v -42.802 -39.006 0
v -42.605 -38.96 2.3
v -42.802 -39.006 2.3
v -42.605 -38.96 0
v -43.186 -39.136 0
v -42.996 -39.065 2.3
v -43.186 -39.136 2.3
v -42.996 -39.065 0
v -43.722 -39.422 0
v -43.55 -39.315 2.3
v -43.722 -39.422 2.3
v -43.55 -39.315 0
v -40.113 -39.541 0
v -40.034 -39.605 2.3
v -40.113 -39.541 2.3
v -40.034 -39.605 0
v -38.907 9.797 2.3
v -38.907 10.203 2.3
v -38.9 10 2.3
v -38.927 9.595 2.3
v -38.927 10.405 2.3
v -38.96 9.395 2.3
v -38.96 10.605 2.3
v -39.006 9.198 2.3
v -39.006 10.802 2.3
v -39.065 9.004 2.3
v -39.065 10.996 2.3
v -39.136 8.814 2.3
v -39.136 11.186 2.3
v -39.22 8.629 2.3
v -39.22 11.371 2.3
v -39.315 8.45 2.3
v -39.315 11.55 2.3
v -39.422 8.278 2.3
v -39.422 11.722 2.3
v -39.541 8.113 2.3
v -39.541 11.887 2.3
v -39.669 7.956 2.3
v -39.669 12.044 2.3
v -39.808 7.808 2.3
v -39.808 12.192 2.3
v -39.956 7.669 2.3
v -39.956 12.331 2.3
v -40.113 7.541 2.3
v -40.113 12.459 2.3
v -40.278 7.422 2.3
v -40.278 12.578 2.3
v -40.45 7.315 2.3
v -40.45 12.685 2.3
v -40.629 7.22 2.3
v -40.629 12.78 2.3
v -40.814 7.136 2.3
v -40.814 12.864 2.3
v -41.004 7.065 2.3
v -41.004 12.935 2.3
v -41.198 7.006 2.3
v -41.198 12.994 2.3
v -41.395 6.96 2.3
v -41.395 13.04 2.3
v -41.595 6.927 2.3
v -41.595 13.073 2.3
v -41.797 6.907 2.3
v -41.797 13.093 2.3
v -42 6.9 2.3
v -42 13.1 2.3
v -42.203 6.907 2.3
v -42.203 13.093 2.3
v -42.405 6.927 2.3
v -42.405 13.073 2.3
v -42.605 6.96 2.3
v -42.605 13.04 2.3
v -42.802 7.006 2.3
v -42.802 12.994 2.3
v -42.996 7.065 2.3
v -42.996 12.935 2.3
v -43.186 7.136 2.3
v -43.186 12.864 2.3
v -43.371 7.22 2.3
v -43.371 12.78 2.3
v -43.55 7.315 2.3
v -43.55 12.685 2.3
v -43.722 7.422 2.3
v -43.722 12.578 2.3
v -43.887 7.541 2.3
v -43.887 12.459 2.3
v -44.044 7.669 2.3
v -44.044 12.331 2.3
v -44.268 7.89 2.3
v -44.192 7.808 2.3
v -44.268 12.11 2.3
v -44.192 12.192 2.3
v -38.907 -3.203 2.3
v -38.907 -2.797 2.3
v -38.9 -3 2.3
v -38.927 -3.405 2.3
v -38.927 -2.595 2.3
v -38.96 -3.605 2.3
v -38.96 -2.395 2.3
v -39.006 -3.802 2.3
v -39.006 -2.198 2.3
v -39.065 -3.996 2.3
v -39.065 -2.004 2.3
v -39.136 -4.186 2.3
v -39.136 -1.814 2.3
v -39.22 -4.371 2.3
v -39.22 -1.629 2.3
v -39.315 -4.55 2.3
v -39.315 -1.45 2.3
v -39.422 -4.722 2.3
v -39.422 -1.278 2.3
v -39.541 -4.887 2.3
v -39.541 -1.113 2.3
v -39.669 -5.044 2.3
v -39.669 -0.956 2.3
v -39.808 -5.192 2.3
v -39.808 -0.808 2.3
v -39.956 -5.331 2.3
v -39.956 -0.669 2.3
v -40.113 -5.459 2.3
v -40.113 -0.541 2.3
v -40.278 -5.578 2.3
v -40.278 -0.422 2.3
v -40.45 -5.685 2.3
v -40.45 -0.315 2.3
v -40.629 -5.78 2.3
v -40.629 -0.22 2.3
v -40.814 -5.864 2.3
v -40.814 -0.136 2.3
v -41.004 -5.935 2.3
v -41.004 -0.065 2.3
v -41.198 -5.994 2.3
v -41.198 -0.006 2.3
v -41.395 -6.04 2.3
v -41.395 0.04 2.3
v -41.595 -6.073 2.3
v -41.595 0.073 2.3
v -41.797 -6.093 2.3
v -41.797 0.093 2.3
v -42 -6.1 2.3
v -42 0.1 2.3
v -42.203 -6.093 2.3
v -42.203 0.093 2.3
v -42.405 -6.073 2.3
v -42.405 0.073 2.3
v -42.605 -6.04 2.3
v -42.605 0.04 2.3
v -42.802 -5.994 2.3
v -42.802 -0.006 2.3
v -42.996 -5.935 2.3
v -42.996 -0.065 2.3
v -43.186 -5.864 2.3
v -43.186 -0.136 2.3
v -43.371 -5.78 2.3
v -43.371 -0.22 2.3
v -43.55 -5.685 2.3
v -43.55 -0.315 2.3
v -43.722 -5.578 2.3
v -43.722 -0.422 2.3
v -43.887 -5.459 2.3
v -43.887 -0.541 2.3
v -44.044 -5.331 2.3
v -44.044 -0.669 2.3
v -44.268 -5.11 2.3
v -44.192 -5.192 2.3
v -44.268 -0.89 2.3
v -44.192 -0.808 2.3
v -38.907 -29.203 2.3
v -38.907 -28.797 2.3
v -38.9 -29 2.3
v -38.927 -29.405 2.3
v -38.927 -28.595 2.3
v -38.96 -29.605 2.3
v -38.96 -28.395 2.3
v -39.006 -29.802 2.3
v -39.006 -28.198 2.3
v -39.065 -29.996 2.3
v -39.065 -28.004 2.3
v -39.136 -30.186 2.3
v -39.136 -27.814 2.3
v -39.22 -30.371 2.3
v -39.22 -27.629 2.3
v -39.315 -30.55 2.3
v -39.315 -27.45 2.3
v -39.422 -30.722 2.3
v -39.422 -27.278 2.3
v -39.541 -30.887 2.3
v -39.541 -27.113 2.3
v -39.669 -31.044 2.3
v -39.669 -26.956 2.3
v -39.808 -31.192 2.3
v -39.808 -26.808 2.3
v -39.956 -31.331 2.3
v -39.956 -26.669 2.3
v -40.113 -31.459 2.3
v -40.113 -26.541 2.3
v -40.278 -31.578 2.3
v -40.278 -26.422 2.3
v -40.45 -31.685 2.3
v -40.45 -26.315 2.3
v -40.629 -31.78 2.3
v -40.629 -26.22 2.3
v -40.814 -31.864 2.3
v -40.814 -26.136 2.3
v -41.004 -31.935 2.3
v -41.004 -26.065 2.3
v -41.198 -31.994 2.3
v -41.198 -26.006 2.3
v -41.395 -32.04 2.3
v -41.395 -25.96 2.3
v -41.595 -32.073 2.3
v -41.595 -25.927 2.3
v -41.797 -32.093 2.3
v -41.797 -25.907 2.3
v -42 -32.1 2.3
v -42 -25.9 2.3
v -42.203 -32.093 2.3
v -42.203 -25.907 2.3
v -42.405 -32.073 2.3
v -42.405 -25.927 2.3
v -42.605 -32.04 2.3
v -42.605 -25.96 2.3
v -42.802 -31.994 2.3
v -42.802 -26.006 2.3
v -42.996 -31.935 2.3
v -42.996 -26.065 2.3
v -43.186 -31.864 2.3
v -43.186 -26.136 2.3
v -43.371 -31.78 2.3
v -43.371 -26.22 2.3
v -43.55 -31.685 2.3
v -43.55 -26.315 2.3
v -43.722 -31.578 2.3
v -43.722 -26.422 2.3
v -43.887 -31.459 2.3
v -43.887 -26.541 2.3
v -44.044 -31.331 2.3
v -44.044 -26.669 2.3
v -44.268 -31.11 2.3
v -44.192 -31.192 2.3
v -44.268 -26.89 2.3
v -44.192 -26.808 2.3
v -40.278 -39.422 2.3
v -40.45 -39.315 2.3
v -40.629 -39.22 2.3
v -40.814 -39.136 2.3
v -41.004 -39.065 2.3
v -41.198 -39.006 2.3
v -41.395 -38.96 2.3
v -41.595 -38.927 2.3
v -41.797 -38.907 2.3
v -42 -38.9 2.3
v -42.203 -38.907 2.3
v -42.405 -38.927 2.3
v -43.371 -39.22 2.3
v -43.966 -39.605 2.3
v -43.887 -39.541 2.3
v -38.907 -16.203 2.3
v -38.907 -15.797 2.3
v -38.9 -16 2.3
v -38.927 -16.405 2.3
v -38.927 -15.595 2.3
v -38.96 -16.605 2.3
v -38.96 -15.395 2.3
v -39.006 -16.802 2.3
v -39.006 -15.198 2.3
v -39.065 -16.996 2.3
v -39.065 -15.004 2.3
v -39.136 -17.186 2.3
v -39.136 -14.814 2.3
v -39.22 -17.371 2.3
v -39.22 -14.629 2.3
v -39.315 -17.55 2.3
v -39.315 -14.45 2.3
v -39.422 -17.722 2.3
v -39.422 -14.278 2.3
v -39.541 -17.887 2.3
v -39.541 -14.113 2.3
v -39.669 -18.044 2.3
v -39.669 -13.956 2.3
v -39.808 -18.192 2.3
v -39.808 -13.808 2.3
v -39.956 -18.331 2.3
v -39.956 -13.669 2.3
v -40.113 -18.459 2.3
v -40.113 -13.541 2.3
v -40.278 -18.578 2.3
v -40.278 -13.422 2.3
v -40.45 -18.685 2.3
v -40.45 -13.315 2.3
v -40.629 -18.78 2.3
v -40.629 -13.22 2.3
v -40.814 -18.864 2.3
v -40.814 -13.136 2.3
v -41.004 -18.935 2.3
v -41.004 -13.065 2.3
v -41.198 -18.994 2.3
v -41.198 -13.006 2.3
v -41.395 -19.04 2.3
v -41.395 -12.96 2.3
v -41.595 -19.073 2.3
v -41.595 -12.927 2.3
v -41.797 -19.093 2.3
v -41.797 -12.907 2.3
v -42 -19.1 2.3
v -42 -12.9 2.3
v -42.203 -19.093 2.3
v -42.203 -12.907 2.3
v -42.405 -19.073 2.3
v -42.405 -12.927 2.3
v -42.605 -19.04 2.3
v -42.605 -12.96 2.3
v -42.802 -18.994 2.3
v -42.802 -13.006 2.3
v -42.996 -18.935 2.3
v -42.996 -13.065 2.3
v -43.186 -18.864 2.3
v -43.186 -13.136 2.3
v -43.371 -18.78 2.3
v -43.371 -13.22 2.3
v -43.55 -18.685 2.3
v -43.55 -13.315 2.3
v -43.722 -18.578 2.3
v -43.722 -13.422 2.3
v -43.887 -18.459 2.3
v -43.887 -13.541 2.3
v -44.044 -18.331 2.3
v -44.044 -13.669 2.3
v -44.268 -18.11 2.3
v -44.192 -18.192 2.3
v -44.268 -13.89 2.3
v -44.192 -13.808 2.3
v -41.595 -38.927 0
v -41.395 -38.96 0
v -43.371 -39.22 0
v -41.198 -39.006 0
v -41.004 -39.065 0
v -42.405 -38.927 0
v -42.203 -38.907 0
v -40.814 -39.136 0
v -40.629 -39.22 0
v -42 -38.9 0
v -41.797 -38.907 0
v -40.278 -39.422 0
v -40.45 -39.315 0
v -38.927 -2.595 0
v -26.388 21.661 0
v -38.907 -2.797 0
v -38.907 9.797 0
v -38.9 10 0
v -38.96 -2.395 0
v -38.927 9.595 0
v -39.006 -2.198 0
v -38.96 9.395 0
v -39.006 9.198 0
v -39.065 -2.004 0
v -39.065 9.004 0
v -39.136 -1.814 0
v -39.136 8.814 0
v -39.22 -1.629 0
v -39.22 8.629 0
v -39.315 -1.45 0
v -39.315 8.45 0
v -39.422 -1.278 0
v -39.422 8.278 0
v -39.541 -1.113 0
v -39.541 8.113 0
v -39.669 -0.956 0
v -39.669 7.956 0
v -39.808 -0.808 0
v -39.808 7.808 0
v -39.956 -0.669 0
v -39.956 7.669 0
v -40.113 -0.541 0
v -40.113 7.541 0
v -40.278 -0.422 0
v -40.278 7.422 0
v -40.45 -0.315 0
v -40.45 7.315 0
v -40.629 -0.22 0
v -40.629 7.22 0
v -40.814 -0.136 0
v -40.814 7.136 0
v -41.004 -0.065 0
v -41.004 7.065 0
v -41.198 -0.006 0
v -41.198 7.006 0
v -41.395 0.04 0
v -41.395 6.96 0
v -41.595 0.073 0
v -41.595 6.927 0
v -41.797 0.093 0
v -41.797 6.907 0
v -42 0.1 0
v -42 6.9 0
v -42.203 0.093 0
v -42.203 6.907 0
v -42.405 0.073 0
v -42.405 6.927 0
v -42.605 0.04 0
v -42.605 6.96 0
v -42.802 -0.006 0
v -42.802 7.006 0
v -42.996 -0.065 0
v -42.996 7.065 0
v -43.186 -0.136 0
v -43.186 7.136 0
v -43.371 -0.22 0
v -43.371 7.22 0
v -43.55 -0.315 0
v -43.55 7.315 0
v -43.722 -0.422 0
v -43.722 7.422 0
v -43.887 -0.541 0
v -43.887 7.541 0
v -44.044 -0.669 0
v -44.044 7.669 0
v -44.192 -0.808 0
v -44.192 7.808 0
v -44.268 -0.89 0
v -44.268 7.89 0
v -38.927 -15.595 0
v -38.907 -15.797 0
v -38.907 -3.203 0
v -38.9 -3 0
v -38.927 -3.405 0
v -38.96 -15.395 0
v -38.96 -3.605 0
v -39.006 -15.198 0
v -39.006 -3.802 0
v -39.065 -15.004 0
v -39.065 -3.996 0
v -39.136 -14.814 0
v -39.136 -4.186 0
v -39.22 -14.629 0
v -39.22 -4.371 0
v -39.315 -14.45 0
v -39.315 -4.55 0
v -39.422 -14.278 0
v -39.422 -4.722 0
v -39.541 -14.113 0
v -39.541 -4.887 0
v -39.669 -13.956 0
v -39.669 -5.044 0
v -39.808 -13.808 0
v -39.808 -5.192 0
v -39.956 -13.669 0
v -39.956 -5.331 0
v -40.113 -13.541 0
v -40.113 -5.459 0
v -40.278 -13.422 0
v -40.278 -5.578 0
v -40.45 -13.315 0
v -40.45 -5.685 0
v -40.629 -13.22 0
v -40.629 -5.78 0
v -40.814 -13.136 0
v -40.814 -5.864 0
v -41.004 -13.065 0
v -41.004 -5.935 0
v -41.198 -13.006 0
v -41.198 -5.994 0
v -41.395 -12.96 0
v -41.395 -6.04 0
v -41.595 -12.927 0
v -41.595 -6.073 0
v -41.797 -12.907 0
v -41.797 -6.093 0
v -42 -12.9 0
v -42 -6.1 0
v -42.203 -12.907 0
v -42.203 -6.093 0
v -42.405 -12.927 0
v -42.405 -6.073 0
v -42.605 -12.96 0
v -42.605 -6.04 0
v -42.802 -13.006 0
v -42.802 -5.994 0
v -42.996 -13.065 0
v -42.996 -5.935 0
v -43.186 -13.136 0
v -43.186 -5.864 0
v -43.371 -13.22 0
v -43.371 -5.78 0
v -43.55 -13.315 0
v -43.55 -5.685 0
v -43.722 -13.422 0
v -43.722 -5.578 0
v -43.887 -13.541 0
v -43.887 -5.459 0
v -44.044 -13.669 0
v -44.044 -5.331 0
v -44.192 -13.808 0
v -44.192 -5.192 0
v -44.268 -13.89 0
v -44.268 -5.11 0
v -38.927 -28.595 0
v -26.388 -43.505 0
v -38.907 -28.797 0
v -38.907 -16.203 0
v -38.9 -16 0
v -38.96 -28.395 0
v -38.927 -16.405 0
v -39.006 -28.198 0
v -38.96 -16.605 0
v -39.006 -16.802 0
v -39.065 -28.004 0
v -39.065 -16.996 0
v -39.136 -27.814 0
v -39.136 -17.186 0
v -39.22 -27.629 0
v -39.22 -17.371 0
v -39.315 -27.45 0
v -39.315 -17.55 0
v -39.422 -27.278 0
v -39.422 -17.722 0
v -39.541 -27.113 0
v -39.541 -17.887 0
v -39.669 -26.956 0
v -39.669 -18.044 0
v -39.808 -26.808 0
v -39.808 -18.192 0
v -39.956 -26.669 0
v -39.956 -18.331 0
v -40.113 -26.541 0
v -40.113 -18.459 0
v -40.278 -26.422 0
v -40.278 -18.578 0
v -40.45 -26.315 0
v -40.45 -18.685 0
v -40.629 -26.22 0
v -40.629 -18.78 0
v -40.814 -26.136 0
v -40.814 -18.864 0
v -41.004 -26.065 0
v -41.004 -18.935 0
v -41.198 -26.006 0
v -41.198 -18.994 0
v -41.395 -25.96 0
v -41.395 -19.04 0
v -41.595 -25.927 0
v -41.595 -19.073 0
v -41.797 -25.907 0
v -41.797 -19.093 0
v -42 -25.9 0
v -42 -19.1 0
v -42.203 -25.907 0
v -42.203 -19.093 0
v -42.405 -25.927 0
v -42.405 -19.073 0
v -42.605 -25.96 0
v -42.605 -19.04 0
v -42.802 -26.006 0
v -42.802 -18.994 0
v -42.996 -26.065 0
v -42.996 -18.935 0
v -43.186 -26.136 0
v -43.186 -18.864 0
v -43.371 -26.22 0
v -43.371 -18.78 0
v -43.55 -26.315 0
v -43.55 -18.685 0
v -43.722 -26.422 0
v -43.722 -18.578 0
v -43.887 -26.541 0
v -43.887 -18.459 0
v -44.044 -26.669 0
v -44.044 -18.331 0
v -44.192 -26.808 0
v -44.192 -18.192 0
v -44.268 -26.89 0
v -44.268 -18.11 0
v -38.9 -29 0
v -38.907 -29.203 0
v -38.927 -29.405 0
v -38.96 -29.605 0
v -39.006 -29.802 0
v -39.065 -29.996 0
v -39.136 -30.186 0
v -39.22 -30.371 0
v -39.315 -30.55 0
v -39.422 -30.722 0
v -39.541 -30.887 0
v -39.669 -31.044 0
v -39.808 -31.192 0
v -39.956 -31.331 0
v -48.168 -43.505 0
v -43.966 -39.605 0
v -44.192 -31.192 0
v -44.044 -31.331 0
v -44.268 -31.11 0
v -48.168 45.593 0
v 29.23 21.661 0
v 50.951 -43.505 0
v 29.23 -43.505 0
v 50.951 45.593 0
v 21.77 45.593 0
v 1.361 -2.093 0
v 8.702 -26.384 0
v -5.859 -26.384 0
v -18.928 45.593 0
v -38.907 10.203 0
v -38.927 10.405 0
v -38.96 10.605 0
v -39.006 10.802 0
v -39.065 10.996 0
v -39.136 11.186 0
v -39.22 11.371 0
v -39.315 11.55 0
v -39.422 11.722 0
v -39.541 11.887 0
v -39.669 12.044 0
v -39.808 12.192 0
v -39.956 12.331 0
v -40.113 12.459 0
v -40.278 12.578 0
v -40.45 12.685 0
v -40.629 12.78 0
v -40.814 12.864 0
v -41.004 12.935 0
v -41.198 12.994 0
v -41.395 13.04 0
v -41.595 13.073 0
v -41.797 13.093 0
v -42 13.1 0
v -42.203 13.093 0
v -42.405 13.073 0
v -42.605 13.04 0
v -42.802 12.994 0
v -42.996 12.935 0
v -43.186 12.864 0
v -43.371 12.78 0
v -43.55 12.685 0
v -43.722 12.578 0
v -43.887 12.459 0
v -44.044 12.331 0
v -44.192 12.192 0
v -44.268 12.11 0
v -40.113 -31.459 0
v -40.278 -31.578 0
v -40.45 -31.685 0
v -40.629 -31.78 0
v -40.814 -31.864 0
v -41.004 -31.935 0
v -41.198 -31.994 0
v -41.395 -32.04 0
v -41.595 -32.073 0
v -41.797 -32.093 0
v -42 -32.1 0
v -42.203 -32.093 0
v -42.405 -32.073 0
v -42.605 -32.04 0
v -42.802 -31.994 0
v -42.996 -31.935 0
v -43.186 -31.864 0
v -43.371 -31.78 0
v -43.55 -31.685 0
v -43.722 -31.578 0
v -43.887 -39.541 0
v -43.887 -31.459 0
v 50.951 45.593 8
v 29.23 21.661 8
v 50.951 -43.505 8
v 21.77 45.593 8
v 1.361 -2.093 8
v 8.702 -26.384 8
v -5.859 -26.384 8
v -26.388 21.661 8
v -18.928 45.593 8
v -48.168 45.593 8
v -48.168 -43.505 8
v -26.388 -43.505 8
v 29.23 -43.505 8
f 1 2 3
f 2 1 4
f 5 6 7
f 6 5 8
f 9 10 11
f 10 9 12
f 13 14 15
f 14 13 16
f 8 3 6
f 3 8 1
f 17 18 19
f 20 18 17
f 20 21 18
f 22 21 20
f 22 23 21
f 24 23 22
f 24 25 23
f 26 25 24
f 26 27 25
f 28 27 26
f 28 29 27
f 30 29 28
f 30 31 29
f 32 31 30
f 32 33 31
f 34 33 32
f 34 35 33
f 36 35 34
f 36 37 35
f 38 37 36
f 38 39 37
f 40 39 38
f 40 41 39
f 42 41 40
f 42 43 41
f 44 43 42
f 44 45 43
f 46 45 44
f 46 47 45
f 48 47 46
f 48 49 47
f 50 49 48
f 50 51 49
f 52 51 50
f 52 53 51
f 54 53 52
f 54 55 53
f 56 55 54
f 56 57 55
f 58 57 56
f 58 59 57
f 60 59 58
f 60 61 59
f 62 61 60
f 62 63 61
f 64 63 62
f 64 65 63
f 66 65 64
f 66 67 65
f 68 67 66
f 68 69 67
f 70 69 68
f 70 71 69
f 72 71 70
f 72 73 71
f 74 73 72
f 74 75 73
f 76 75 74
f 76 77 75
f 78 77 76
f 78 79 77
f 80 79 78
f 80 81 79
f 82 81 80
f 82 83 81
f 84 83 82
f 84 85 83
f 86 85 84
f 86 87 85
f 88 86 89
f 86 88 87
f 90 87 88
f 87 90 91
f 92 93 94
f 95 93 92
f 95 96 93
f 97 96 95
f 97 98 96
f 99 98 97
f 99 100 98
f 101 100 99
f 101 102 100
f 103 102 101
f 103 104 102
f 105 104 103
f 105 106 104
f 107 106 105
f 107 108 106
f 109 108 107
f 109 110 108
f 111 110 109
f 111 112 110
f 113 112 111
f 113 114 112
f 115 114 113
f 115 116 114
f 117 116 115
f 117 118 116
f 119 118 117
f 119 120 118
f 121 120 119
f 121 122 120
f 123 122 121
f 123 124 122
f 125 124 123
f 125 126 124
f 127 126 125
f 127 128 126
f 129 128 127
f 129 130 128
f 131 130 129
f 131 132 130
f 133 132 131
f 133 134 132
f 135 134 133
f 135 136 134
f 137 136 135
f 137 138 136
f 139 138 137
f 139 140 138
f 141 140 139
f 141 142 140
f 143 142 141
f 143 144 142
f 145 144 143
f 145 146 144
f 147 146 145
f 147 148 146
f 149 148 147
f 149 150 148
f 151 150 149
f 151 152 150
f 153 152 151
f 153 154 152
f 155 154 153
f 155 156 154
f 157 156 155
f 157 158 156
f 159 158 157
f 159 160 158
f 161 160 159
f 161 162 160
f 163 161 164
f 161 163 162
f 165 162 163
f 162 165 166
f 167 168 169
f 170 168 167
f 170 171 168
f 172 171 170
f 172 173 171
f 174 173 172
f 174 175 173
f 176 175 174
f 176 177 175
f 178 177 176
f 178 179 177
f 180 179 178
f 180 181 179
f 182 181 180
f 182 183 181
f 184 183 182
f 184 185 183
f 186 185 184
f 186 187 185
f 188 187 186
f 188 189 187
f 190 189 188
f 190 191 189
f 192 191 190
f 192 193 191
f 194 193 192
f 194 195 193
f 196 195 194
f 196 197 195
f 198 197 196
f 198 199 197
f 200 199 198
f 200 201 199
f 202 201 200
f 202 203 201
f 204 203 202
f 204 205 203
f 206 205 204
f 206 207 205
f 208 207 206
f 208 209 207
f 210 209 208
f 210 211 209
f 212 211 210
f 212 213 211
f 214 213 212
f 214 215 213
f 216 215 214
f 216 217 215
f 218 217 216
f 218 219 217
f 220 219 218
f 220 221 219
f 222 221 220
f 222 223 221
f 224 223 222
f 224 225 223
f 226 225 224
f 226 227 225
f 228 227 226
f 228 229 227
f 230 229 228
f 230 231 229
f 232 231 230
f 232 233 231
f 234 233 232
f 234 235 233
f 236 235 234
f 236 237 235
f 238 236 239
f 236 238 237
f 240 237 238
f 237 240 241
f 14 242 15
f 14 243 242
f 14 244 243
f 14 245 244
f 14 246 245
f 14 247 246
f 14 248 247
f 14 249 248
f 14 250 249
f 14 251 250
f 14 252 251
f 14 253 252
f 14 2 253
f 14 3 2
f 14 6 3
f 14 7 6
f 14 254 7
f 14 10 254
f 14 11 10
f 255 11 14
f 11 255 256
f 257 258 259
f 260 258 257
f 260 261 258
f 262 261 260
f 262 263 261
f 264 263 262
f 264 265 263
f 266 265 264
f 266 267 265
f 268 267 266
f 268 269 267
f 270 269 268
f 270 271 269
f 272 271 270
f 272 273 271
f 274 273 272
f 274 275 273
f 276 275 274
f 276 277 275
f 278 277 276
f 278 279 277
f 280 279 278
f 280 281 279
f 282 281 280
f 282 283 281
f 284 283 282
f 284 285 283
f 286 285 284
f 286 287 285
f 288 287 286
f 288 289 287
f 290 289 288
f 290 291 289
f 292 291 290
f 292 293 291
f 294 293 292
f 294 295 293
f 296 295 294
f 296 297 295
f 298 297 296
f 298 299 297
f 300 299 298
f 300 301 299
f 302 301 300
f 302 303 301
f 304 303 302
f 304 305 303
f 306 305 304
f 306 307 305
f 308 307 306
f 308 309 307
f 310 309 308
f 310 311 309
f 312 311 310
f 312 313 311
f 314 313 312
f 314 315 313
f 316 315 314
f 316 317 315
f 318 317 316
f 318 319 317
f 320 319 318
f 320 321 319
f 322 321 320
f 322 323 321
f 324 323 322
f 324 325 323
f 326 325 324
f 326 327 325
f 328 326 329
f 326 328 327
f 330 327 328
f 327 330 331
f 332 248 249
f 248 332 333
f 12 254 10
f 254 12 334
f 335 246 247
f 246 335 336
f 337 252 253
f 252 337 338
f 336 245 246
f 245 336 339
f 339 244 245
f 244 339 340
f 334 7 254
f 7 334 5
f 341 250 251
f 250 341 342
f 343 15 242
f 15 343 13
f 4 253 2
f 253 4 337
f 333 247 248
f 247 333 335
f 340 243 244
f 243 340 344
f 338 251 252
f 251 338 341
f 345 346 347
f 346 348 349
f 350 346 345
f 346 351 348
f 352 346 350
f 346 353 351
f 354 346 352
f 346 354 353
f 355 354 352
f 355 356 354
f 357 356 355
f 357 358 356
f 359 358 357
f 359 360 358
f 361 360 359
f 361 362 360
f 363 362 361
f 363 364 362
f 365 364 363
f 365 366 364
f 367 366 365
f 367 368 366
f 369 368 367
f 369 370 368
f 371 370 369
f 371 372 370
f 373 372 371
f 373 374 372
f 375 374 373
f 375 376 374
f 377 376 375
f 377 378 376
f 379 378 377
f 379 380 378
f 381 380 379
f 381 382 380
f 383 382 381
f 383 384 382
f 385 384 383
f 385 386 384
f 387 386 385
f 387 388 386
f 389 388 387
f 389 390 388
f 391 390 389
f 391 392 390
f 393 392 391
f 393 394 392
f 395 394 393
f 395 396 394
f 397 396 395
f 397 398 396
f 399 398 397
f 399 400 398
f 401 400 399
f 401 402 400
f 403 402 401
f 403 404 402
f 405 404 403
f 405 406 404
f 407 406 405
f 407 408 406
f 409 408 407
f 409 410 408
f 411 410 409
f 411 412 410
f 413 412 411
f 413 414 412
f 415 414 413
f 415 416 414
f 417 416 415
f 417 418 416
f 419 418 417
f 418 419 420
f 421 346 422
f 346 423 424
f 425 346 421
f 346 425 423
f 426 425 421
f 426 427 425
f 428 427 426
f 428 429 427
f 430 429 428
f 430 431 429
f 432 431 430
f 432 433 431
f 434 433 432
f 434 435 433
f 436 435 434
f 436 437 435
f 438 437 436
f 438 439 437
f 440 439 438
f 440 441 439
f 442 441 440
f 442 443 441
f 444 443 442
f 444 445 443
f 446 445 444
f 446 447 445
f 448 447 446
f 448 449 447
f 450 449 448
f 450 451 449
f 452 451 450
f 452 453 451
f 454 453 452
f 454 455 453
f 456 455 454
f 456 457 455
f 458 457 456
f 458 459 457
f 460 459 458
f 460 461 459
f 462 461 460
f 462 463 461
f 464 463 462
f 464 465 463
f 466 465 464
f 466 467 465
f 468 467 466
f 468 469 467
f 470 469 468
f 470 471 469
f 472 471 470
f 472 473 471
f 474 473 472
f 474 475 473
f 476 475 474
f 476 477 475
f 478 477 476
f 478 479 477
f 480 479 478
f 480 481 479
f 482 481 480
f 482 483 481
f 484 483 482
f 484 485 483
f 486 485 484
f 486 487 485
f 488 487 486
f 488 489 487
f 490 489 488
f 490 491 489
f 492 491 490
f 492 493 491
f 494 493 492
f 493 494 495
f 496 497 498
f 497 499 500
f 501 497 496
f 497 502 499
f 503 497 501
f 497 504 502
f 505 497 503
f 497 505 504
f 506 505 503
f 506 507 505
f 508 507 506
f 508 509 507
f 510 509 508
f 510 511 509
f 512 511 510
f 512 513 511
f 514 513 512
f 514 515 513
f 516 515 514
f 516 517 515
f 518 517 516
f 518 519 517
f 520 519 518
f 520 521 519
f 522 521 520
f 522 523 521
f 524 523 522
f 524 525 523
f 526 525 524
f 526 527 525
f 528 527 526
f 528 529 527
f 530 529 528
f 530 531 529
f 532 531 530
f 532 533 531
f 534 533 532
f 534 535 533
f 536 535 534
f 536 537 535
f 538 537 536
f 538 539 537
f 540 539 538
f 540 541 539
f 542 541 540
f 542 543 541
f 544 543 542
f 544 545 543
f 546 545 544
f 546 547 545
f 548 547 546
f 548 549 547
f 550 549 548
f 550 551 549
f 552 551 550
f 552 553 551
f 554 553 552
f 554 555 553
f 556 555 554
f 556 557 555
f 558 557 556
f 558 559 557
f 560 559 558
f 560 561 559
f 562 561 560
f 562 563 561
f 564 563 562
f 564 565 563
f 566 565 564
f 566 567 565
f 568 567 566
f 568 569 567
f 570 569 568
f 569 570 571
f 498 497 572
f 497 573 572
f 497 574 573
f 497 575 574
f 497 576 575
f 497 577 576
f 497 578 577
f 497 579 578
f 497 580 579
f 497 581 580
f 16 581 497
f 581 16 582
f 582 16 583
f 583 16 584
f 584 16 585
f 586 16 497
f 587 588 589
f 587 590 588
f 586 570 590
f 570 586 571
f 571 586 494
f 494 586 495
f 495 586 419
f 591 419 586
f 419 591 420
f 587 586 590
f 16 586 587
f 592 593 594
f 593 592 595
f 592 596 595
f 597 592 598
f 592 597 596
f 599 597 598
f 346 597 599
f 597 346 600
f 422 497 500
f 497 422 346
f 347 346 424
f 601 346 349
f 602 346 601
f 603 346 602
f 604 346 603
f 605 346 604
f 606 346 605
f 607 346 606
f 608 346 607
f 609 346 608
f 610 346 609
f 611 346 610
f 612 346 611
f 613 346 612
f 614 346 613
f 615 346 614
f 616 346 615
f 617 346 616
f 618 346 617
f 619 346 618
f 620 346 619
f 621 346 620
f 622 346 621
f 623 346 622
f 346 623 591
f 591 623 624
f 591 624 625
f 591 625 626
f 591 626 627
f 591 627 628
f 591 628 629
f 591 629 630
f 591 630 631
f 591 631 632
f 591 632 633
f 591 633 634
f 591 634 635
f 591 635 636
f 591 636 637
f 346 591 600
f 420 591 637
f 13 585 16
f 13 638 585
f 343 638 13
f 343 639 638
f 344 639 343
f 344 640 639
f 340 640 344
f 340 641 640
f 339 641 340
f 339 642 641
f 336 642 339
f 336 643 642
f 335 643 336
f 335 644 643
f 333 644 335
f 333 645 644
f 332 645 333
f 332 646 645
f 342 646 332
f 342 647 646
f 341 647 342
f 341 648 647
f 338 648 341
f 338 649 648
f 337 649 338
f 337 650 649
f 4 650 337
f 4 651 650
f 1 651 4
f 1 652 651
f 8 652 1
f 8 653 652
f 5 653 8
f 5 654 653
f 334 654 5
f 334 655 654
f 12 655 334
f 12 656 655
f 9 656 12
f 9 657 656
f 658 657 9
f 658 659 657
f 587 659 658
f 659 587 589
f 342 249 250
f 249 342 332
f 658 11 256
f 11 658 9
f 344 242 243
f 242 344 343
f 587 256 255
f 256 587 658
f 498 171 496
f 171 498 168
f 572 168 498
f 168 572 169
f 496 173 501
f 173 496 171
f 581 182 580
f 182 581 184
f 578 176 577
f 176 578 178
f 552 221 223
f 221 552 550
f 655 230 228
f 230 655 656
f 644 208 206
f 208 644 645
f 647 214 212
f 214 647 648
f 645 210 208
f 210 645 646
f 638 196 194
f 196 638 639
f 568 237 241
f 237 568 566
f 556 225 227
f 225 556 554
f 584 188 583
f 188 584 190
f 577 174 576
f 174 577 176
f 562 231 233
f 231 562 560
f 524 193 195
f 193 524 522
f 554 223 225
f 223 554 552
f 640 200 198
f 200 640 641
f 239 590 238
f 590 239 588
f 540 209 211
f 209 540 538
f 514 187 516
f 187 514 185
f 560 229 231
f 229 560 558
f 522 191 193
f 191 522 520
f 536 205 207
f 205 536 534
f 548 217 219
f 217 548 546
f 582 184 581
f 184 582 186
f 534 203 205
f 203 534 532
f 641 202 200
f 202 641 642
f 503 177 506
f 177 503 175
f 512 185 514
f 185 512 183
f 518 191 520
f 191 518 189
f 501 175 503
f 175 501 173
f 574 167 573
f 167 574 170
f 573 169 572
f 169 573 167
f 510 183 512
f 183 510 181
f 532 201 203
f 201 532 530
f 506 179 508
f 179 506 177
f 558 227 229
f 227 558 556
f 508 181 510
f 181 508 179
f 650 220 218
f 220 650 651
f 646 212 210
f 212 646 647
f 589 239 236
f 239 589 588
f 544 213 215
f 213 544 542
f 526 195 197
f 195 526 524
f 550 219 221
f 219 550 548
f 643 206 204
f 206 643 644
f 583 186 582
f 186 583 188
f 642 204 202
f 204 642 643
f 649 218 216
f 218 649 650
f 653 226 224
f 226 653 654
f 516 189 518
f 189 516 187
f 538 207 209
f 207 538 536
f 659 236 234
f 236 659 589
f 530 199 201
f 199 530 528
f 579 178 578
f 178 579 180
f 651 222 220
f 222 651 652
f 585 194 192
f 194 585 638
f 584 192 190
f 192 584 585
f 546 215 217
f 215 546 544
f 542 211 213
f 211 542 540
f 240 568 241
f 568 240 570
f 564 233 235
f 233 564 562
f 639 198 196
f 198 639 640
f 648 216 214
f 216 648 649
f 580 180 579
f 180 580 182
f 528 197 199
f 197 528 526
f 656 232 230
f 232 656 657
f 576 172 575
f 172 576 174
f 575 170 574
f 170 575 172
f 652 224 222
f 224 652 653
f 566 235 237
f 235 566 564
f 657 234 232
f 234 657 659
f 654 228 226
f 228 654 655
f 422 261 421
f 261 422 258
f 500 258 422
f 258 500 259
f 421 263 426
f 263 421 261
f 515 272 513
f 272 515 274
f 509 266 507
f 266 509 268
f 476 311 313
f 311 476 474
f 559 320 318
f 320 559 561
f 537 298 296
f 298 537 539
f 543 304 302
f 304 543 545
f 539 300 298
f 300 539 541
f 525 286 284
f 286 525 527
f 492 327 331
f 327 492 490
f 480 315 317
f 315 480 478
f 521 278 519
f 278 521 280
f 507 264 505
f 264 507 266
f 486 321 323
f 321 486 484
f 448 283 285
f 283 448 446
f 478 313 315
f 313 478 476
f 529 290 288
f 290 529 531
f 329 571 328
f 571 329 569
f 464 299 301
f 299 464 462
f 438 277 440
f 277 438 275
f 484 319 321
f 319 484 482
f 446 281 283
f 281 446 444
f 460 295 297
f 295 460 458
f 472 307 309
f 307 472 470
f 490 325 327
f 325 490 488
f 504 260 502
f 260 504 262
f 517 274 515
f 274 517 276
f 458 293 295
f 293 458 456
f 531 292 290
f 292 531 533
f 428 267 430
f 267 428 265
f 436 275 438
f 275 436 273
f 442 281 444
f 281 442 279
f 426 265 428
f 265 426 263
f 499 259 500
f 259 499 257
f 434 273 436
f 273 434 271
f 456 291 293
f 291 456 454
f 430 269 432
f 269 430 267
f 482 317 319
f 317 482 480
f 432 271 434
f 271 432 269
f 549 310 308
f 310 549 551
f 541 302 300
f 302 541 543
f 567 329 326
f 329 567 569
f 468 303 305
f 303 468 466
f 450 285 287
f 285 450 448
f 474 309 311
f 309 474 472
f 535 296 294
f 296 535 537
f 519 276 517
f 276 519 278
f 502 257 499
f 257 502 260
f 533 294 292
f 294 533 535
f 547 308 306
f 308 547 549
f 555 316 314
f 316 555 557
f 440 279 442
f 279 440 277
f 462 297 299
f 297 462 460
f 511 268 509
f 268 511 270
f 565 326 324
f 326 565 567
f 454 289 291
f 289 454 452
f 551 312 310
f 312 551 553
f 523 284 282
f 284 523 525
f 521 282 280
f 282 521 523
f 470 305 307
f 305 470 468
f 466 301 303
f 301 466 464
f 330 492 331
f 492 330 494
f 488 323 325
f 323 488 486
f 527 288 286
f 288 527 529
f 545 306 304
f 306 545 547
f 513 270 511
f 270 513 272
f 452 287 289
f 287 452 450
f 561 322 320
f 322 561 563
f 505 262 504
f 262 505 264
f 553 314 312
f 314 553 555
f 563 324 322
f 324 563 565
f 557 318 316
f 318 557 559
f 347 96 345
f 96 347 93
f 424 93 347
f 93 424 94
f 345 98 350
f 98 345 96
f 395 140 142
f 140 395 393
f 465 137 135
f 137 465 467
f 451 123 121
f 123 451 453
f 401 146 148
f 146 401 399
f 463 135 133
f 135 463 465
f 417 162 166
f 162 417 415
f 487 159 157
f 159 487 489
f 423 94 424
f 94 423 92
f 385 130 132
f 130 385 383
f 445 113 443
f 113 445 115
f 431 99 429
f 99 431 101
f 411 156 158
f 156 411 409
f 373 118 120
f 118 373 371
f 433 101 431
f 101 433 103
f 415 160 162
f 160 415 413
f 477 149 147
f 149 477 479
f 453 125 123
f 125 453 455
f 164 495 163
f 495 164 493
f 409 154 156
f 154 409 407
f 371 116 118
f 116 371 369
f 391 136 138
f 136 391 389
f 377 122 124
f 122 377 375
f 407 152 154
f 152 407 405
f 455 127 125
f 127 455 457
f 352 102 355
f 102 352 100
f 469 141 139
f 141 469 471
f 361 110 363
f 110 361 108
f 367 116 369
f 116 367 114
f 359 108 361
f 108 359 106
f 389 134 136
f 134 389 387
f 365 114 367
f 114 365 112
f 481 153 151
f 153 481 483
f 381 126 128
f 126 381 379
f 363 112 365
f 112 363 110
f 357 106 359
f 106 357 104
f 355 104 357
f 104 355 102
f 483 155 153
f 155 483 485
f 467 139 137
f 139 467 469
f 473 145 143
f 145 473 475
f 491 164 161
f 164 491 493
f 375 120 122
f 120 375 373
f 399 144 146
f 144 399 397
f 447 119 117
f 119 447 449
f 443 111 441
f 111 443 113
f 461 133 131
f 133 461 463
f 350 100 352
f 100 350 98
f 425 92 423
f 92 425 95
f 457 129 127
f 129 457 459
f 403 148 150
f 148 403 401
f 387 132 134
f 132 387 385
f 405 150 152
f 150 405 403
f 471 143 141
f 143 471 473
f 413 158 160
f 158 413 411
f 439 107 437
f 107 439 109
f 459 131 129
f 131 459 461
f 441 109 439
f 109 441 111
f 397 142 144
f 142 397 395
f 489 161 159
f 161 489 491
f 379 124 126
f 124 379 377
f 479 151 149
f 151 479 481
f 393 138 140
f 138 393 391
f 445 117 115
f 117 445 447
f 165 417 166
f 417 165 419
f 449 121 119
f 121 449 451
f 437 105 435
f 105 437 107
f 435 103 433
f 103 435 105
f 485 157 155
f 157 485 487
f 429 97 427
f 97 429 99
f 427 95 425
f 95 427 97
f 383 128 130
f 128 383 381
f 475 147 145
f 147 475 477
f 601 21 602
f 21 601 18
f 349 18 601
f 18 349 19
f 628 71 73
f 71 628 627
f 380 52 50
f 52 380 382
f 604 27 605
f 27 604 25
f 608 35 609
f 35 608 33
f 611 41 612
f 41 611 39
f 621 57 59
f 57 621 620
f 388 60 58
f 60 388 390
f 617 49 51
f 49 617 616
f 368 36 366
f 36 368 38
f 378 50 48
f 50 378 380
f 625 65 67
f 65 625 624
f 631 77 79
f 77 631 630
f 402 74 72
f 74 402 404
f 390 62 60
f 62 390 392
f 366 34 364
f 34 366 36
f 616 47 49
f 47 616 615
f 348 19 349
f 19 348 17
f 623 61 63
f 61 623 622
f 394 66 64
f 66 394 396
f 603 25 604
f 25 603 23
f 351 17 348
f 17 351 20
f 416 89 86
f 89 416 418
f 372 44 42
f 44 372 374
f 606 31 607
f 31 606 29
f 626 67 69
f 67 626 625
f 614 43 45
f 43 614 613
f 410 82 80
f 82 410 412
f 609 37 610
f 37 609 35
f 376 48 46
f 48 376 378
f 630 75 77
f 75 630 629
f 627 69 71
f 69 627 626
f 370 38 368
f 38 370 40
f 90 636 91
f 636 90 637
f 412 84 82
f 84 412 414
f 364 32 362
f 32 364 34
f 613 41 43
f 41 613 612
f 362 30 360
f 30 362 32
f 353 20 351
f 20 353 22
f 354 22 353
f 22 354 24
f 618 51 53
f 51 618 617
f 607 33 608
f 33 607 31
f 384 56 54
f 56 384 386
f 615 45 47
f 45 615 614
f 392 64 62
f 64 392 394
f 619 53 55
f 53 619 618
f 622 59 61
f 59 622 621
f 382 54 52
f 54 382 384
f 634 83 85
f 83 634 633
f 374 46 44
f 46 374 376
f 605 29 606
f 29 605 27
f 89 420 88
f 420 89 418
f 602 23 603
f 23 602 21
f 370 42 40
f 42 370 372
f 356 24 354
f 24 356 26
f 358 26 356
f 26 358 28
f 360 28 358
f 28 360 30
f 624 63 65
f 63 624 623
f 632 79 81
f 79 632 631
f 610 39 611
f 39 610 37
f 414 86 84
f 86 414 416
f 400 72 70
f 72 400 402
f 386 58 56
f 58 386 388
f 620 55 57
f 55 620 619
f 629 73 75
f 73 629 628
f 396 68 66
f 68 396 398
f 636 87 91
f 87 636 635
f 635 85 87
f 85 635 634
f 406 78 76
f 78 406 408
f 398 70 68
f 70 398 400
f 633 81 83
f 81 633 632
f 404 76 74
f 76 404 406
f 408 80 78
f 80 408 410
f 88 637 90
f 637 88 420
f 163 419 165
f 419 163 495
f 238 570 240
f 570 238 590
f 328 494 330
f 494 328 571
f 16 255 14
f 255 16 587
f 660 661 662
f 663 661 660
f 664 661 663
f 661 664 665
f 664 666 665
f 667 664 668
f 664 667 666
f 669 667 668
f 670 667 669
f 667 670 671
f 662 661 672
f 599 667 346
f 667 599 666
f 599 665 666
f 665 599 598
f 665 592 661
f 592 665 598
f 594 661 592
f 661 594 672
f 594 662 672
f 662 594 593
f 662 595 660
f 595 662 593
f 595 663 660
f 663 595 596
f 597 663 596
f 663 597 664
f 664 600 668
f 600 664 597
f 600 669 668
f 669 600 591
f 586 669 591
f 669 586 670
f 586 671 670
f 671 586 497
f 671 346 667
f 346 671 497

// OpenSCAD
// Magnetic Letters Pro (single-letter export)
//
// Render one letter:
//   openscad -q -D 'letter="M"' -o M.stl magnetic_letter_only.scad
//
// Goals of this version:
// 1) Clean letter silhouette by default (no forced backplate)
// 2) Safer pocket placement that stays inside the glyph
// 3) Better font controls and quality settings for print clarity

// ── Core text settings ──────────────────────────────────────────────────────
letter = "M";
font_name = "Bahnschrift:style=Bold";
letter_size = 88;         // Letter height in mm (88 ~= fits 100x100 bed)
letter_thickness = 8;     // Main print thickness
// Keep this off for glyph exports: hull-based chamfering can bridge open
// spaces in letters like M/W and create an unwanted backplate.
emboss_chamfer = 0;       // Optional top edge softening (tile mode only)

// Optional reinforcing tile (disabled by default to avoid unwanted backplate)
shape_mode = "glyph";    // "glyph" | "tile"
tile_margin = 4;          // Only used in tile mode

// ── Magnet settings ─────────────────────────────────────────────────────────
magnet_d = 6.2;           // pocket diameter for nominal 6 mm magnets
magnet_depth = 2.3;
edge_clearance = 0.8;     // distance from pocket edge to letter edge
max_magnets = 5;

// Placement strategy
magnet_mode = "auto_grid"; // "auto_grid" | "spine" | "manual"
manual_positions = [[-18, 16], [16, -16], [0, 0]];

// Auto-grid tunables
grid_pitch = 13;          // spacing between candidate centers
grid_extent = 42;         // candidate search radius

// Spine tunables (good for skinny letters)
spine_samples = 7;
spine_y_span = 30;

$fn = $preview ? 28 : 96;

// ── Geometry helpers ────────────────────────────────────────────────────────
module glyph_2d() {
  text(letter, size = letter_size, font = font_name,
    halign = "center", valign = "center");
}

module tile_2d() {
  offset(delta = tile_margin) glyph_2d();
}

module printable_shape_2d() {
  if (shape_mode == "tile") tile_2d();
  else glyph_2d();
}

// Eroded mask that guarantees full magnet fit within letter body.
module safe_magnet_mask_2d() {
  offset(r = -(magnet_d / 2 + edge_clearance)) printable_shape_2d();
}

module letter_body() {
  body_chamfer = shape_mode == "tile" ? emboss_chamfer : 0;

  if (body_chamfer > 0) {
    linear_extrude(height = letter_thickness - body_chamfer)
      printable_shape_2d();

    // Simple stepped chamfer near top for connected plaque/tile shapes.
    for (i = [0:4]) {
      t0 = i / 5;
      t1 = (i + 1) / 5;
      h0 = letter_thickness - body_chamfer + body_chamfer * t0;
      h1 = letter_thickness - body_chamfer + body_chamfer * t1;
      in0 = body_chamfer * 0.45 * t0;
      in1 = body_chamfer * 0.45 * t1;
      hull() {
        translate([0, 0, h0]) linear_extrude(0.01) offset(r = -in0) printable_shape_2d();
        translate([0, 0, h1]) linear_extrude(0.01) offset(r = -in1) printable_shape_2d();
      }
    }
  } else {
    linear_extrude(height = letter_thickness) printable_shape_2d();
  }
}

// ── Pocket candidate generation ─────────────────────────────────────────────
function clamp_count(n, lo, hi) = min(max(n, lo), hi);

function grid_candidates(extent, pitch) =
  [for (x = [-extent:pitch:extent]) for (y = [-extent:pitch:extent]) [x, y]];

function spine_candidates(n, y_span) =
  [for (i = [0:n - 1]) [0, y_span * (i / max(n - 1, 1) - 0.5)]];

module candidate_pockets() {
  pts = magnet_mode == "manual" ? manual_positions
    : magnet_mode == "spine" ? spine_candidates(spine_samples, spine_y_span)
    : grid_candidates(grid_extent, grid_pitch);

  // Keep pocket count bounded. First points are closest to center for grid mode.
  count = clamp_count(max_magnets, 1, len(pts));

  for (i = [0:count - 1]) {
    p = pts[i];
    translate([p[0], p[1], 0])
      cylinder(h = magnet_depth, d = magnet_d);
  }
}

// Final pocket set is clipped against the safe eroded mask.
module safe_pockets() {
  intersection() {
    linear_extrude(height = magnet_depth)
      safe_magnet_mask_2d();
    candidate_pockets();
  }
}

// ── Build ────────────────────────────────────────────────────────────────────
echo(str("MagneticLettersPro letter=", letter,
  " font=", font_name,
  " mode=", magnet_mode,
  " shape=", shape_mode,
  " magnets<=", max_magnets));

difference() {
  letter_body();
  safe_pockets();
}
